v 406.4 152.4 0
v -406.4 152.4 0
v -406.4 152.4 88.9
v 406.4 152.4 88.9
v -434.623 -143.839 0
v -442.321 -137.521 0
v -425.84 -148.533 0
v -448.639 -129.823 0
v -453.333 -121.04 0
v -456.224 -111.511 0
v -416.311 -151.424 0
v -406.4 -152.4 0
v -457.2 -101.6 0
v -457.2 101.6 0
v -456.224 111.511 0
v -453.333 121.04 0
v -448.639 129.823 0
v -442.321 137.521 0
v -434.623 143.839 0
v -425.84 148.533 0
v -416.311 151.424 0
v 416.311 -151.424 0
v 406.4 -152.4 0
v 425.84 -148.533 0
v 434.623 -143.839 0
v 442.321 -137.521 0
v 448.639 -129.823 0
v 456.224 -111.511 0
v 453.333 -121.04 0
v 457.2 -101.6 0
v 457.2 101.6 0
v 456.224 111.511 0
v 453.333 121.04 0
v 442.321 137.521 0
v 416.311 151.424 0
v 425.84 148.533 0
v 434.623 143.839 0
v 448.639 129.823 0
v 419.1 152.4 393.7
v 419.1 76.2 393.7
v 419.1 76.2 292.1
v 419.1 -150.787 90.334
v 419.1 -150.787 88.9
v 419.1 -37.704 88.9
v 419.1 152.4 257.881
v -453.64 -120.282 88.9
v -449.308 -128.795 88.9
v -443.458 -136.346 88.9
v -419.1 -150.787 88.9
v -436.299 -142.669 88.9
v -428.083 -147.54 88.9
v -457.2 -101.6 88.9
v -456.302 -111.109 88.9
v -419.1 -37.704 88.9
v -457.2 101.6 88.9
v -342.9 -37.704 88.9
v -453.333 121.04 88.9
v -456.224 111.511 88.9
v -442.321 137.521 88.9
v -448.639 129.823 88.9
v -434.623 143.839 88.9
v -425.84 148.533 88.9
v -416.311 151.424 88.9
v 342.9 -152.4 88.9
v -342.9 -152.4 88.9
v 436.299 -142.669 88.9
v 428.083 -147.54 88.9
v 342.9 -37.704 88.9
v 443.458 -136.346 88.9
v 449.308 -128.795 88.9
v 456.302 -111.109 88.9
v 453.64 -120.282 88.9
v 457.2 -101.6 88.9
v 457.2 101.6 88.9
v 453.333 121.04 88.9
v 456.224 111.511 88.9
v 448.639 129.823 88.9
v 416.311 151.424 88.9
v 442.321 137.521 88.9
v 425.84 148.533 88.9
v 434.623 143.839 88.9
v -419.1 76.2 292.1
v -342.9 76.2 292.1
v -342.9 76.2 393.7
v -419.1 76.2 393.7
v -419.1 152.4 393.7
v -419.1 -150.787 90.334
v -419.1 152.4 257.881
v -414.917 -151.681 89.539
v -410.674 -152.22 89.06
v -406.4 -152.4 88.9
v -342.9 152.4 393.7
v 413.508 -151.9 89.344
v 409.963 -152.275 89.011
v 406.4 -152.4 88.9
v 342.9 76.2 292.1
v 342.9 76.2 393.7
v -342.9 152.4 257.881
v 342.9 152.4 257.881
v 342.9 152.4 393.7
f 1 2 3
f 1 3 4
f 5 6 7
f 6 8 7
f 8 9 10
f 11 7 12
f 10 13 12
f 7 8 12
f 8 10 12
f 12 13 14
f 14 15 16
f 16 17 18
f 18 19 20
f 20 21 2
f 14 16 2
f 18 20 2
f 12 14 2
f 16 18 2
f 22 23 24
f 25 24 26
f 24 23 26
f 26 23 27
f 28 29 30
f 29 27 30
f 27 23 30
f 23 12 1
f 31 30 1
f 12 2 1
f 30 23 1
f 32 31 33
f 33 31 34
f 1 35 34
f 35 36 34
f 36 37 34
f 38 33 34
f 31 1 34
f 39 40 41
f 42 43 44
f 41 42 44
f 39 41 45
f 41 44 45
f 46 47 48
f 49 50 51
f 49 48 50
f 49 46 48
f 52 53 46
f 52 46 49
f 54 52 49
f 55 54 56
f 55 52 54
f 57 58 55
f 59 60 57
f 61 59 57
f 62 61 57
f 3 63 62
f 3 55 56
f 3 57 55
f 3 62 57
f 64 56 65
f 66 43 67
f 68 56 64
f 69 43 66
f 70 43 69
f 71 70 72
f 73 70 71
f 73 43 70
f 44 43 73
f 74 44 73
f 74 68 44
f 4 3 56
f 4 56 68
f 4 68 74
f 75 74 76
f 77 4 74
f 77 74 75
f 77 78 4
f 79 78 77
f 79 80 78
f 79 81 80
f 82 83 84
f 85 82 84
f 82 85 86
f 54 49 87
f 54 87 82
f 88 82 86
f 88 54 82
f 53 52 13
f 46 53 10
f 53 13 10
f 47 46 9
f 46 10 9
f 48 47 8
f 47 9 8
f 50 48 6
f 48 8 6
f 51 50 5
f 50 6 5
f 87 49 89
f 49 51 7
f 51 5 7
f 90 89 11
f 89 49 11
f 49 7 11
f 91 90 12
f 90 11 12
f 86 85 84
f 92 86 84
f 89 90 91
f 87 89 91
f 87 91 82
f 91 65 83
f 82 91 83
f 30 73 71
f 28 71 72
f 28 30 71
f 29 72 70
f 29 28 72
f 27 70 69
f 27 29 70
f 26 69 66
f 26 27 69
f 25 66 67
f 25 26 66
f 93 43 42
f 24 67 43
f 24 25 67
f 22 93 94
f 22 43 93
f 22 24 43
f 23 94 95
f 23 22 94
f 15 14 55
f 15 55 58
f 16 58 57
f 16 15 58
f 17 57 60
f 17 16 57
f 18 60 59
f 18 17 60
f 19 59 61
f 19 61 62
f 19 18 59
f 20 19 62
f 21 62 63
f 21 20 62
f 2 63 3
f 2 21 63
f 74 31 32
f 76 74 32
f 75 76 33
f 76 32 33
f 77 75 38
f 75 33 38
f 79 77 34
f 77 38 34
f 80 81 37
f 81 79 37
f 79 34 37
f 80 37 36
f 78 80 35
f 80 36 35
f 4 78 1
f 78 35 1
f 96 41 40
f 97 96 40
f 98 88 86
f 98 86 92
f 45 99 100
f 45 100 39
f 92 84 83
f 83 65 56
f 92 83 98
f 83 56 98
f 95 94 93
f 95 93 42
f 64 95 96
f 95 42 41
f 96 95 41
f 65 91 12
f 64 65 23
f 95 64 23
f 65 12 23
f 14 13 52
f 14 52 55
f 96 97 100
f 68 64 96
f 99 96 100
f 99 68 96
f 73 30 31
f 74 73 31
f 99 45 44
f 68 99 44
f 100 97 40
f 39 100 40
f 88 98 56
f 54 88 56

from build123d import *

# Parameters (mm, degrees)
F0_W        = 914.4
F0_H        = 304.8
F1_DEPTH    = 88.9
F2_W        = 76.2
F2_H        = 304.8
F3_DEPTH    = 304.8
F5_DEPTH    = 876.301
F6_T1_DEPTH = 342.9


# Not quite as in the source:
# - a fillet or chamfer that OpenCascade refuses, or shapes differently, is made with other operations: its cross-section is extruded or revolved along the edge and cut away or added


with BuildPart() as f1:
    # F0 (on Top) → F1 (new body)
    with BuildSketch(Plane.XY):
        Rectangle(F0_W, F0_H)
    extrude(amount=F1_DEPTH)

    # F2 (on face) → F3 (join)
    with BuildSketch(Plane.XY.offset(88.9)):
        with Locations((-381, 0)):
            Rectangle(F2_W, F2_H)
        with Locations((381, 0)):
            Rectangle(F2_W, F2_H)
    extrude(amount=F3_DEPTH)

    # F4 (on face) → F5 (cut, through all)
    with BuildSketch(Plane.YZ.offset(419.1)):
        Polygon((76.2, 292.1), (76.2, 393.7), (-152.4, 393.7), (-152.4, 88.9), align=None)
        Polygon((152.4, 88.9), (152.4, 257.8811658996), (-37.703811637, 88.9), align=None)
    extrude(amount=-F5_DEPTH, mode=Mode.SUBTRACT)

    # F6: fillet of radius 50.8 on 4 edges, made by hand

    # F6_s2 → F6_t1 (cut)
    with BuildSketch(Plane.XY.offset(-127)):
        with BuildLine():
            ThreePointArc((-457.2, -101.6), (-442.3210244843, -137.5210244843), (-406.4, -152.4))
            Line((-406.4, -152.4), (-457.2, -152.4))
            Line((-457.2, -152.4), (-457.2, -101.6))
        make_face()
        with BuildLine():
            ThreePointArc((457.2, -101.6), (442.3210244843, -137.5210244843), (406.4, -152.4))
            Line((406.4, -152.4), (457.2, -152.4))
            Line((457.2, -152.4), (457.2, -101.6))
        make_face()
        with BuildLine():
            ThreePointArc((457.2, 101.6), (442.3210244843, 137.5210244843), (406.4, 152.4))
            Line((406.4, 152.4), (457.2, 152.4))
            Line((457.2, 152.4), (457.2, 101.6))
        make_face()
        with BuildLine():
            ThreePointArc((-457.2, 101.6), (-442.3210244843, 137.5210244843), (-406.4, 152.4))
            Line((-406.4, 152.4), (-457.2, 152.4))
            Line((-457.2, 152.4), (-457.2, 101.6))
        make_face()
    extrude(amount=F6_T1_DEPTH, mode=Mode.SUBTRACT)


solid = f1.part
